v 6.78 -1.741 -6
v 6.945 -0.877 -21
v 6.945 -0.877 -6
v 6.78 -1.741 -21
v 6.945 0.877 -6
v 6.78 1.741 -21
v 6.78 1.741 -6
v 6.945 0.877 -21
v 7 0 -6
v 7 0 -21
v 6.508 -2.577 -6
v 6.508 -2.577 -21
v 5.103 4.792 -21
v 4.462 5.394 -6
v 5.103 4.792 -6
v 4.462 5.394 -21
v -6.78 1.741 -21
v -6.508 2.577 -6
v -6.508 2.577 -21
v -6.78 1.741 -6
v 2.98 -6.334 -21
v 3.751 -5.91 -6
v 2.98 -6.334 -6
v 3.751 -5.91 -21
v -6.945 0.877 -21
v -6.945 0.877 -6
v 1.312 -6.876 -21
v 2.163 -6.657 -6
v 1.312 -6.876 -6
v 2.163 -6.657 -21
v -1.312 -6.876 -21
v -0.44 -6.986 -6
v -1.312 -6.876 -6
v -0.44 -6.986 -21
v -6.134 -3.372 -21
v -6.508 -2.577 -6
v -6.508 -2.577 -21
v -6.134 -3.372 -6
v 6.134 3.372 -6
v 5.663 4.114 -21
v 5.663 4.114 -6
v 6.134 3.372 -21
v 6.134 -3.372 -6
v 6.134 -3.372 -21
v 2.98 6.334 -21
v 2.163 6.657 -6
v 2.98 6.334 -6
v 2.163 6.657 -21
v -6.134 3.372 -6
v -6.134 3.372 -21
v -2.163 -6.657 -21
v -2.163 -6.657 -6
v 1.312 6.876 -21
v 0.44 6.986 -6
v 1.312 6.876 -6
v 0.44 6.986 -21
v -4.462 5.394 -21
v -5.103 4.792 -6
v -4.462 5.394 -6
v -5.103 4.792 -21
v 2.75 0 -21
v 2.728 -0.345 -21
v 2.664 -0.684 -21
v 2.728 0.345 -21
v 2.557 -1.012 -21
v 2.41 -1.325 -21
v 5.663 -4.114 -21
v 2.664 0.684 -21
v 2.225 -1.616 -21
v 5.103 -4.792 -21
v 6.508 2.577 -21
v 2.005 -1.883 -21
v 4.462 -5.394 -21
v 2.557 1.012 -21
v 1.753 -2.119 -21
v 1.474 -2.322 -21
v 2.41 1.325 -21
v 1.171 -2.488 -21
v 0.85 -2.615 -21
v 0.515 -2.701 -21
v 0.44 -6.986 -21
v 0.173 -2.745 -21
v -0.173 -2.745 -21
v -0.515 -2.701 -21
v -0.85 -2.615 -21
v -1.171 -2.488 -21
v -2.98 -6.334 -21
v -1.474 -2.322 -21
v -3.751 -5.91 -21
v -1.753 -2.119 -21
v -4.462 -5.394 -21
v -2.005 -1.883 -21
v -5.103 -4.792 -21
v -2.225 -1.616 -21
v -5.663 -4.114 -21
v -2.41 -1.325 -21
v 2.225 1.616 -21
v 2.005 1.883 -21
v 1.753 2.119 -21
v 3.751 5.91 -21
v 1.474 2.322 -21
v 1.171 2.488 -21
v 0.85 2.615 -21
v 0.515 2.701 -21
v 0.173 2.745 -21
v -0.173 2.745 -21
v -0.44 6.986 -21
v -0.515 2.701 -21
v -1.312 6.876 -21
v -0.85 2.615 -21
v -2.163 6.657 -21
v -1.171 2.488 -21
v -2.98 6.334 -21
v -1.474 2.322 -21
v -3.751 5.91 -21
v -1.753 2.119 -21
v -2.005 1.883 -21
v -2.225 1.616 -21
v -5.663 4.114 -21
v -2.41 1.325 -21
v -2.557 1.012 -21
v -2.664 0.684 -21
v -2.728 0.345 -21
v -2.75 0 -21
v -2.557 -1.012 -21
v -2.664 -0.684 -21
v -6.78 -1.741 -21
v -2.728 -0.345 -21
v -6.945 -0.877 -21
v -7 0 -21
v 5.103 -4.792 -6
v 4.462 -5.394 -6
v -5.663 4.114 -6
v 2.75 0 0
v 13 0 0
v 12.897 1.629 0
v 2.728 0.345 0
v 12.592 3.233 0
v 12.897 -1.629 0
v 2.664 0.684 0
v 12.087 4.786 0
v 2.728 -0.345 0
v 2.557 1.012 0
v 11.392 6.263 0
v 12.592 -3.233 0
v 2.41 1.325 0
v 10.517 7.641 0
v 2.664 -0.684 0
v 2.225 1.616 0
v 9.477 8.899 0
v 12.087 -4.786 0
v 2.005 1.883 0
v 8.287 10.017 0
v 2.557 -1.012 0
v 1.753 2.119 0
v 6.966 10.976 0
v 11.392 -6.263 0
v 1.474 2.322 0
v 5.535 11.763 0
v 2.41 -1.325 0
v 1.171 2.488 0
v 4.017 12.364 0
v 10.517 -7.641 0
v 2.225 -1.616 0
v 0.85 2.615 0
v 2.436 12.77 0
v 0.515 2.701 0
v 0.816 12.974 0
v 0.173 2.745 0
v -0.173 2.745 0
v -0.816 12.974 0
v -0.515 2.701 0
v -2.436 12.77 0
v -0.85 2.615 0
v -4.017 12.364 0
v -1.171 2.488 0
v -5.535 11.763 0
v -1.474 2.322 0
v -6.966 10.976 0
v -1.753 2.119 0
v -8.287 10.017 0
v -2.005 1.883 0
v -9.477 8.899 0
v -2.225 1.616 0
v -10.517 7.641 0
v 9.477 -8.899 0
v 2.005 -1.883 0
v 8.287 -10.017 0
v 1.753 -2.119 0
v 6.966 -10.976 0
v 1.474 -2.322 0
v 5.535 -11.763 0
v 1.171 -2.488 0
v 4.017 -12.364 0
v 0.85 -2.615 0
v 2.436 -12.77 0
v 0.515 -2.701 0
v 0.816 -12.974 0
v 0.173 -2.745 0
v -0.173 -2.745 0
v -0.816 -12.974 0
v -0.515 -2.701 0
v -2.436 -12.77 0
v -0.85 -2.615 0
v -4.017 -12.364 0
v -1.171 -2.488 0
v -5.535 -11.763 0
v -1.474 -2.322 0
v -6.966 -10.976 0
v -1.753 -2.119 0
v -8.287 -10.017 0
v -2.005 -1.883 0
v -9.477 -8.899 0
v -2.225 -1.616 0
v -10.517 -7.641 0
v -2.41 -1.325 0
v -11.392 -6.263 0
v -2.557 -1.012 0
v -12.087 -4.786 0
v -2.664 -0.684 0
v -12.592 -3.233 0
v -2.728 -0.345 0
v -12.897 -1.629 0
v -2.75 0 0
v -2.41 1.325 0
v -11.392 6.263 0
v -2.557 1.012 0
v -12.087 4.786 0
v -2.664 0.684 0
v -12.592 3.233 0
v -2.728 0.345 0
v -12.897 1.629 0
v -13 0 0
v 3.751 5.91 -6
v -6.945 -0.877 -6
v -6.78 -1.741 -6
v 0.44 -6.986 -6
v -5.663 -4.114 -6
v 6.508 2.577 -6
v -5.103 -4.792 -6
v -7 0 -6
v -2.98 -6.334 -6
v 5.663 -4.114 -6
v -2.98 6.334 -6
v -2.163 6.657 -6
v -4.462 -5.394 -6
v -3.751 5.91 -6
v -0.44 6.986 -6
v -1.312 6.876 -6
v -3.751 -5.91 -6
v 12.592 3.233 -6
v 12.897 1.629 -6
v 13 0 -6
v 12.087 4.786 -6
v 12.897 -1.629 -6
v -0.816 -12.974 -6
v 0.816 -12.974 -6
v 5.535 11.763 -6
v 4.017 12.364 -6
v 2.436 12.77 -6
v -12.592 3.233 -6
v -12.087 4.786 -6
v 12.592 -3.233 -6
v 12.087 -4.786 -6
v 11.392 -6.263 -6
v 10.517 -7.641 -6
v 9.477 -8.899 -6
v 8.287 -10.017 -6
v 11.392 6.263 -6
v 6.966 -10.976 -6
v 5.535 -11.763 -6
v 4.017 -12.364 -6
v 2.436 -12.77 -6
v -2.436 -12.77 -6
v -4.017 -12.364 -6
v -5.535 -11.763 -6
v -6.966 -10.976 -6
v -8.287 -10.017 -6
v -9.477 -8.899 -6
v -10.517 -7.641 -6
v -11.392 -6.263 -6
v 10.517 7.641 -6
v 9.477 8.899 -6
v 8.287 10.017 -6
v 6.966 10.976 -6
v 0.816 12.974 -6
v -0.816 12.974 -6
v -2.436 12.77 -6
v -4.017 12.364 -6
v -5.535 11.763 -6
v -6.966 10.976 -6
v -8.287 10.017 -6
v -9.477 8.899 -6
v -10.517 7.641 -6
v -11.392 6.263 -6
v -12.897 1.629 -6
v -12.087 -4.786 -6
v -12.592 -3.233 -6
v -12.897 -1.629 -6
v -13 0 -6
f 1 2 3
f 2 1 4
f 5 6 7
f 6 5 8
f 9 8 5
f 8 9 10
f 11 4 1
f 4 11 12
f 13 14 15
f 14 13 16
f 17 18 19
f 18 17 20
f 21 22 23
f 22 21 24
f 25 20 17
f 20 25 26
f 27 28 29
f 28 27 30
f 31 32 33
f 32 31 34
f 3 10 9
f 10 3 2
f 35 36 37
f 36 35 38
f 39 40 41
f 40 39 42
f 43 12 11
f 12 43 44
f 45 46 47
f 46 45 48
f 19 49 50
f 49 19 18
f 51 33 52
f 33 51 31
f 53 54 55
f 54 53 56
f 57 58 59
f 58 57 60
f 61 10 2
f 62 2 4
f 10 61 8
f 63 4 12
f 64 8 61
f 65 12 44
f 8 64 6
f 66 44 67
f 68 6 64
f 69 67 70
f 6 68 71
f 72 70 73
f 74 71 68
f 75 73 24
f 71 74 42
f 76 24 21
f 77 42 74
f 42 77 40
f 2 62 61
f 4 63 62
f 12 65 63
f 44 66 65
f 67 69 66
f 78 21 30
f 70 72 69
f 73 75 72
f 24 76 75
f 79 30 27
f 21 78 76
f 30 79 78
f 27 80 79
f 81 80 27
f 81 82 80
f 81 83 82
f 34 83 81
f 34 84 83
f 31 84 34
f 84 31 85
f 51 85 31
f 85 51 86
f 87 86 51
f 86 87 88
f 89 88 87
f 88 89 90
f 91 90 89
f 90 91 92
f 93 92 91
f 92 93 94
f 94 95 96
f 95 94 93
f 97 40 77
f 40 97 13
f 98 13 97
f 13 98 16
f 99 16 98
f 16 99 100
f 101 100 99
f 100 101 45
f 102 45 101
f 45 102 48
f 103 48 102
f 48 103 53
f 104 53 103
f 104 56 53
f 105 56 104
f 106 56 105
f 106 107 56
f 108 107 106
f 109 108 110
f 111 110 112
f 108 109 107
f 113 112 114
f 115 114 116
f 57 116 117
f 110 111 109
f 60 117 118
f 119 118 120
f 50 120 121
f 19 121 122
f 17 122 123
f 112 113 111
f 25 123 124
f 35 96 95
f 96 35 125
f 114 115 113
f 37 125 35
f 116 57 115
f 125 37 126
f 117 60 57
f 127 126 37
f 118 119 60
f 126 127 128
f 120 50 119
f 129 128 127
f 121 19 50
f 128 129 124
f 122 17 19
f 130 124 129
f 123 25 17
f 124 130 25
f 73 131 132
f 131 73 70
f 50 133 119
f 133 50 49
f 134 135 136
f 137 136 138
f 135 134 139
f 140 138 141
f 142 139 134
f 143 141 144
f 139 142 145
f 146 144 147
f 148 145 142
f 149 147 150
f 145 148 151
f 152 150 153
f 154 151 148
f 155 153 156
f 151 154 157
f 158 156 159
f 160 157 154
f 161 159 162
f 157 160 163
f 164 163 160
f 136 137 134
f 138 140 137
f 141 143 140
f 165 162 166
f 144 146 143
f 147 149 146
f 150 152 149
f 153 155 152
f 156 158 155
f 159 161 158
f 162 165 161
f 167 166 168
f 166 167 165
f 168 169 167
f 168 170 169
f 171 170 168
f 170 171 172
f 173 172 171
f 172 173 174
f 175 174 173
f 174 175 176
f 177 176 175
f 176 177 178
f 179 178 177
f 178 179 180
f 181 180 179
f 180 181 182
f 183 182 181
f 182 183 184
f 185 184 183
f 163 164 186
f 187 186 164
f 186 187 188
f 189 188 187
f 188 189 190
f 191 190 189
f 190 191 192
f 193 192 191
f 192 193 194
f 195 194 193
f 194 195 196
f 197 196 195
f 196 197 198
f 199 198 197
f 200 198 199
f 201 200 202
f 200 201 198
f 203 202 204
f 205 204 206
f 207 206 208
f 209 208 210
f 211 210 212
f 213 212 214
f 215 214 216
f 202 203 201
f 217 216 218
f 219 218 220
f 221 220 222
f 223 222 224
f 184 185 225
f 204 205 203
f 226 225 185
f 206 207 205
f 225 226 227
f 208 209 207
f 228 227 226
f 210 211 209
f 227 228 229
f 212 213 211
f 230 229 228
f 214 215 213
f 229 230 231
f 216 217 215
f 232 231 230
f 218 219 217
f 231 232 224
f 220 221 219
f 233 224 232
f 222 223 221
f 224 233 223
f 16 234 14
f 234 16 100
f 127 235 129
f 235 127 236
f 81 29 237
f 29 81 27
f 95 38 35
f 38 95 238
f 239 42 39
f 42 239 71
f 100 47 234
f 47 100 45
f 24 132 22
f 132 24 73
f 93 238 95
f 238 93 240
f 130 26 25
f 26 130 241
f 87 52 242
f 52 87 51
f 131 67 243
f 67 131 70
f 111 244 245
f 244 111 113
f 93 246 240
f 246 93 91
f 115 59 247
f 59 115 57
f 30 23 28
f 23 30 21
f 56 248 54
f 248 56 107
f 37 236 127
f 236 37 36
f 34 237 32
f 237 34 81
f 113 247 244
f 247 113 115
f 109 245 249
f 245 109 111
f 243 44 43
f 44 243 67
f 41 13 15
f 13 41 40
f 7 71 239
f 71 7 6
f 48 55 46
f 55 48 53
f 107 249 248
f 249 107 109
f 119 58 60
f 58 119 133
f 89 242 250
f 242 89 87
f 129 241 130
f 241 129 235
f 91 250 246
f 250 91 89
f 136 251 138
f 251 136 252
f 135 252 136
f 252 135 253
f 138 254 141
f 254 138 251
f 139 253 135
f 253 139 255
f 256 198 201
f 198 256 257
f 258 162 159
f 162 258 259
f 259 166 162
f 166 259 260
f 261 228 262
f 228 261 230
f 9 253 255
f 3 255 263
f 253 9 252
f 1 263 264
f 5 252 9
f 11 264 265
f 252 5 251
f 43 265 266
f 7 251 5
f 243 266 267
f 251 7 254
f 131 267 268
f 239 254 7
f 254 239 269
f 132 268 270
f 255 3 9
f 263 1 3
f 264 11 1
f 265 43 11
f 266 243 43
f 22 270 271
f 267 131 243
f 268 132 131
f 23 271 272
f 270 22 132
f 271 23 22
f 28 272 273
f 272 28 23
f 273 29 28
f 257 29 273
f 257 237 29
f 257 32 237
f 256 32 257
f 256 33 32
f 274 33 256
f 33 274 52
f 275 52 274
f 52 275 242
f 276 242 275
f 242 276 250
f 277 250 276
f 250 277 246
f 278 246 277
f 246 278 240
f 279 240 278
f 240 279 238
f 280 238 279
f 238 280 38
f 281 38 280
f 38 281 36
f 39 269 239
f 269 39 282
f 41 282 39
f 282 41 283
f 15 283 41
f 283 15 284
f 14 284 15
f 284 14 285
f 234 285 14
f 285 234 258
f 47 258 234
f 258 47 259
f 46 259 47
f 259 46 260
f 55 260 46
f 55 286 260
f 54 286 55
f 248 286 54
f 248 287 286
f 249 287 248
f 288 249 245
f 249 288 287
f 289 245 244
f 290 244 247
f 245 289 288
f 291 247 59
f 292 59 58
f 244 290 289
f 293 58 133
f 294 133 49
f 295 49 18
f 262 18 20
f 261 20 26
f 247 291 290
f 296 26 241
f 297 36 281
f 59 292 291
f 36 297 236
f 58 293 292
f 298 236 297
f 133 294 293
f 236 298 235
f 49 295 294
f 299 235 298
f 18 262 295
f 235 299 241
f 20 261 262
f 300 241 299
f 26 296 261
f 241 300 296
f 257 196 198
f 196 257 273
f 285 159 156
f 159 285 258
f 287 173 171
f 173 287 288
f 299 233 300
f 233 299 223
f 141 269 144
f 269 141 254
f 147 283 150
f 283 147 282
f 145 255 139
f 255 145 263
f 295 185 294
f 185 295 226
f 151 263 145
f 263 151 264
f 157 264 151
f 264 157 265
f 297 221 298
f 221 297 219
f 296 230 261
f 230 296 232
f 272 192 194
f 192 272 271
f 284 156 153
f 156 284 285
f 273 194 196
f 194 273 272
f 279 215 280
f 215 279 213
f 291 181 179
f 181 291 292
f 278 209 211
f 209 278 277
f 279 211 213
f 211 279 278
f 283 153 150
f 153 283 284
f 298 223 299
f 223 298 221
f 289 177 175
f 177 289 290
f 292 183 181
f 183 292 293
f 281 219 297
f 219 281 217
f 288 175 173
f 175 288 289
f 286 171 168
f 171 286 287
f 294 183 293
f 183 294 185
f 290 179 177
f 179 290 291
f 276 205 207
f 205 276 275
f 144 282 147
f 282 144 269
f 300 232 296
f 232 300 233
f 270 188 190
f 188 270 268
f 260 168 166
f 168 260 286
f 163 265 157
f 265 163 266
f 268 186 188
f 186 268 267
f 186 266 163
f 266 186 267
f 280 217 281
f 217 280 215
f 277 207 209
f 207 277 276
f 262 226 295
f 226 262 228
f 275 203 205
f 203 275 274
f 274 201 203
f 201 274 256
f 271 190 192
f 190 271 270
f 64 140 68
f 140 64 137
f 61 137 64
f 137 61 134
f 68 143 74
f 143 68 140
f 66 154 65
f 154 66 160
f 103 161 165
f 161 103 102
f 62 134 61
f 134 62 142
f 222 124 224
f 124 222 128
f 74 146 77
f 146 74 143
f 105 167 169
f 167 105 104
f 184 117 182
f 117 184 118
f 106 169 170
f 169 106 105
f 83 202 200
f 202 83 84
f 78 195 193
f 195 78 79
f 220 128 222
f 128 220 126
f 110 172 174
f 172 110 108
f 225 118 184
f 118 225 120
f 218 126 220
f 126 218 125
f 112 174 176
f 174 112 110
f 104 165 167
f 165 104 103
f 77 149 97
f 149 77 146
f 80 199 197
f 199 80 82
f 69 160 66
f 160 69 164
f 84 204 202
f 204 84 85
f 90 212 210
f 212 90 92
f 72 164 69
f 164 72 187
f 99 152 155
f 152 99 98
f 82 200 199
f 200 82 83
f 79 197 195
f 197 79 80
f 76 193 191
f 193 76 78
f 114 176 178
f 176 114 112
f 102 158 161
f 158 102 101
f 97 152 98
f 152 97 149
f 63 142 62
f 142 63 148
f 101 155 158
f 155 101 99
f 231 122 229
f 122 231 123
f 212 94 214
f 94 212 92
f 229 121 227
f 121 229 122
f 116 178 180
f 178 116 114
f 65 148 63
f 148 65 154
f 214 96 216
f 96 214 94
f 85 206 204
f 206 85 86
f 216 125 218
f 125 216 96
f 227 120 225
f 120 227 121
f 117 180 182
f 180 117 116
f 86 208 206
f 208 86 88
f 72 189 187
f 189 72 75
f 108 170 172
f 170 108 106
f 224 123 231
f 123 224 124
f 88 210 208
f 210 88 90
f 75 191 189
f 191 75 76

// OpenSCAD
$fn = 50;


difference() {
	union() {
		translate(v = [0, 0, -21.0000000000]) {
			cylinder(h = 21, r = 7.0000000000);
		}
		translate(v = [0, 0, -6.0000000000]) {
			cylinder(h = 6, r = 13.0000000000);
		}
	}
	union() {
		#translate(v = [0, 0, -21]) {
			cylinder(h = 21, r = 2.7500000000);
		}
	}
}
